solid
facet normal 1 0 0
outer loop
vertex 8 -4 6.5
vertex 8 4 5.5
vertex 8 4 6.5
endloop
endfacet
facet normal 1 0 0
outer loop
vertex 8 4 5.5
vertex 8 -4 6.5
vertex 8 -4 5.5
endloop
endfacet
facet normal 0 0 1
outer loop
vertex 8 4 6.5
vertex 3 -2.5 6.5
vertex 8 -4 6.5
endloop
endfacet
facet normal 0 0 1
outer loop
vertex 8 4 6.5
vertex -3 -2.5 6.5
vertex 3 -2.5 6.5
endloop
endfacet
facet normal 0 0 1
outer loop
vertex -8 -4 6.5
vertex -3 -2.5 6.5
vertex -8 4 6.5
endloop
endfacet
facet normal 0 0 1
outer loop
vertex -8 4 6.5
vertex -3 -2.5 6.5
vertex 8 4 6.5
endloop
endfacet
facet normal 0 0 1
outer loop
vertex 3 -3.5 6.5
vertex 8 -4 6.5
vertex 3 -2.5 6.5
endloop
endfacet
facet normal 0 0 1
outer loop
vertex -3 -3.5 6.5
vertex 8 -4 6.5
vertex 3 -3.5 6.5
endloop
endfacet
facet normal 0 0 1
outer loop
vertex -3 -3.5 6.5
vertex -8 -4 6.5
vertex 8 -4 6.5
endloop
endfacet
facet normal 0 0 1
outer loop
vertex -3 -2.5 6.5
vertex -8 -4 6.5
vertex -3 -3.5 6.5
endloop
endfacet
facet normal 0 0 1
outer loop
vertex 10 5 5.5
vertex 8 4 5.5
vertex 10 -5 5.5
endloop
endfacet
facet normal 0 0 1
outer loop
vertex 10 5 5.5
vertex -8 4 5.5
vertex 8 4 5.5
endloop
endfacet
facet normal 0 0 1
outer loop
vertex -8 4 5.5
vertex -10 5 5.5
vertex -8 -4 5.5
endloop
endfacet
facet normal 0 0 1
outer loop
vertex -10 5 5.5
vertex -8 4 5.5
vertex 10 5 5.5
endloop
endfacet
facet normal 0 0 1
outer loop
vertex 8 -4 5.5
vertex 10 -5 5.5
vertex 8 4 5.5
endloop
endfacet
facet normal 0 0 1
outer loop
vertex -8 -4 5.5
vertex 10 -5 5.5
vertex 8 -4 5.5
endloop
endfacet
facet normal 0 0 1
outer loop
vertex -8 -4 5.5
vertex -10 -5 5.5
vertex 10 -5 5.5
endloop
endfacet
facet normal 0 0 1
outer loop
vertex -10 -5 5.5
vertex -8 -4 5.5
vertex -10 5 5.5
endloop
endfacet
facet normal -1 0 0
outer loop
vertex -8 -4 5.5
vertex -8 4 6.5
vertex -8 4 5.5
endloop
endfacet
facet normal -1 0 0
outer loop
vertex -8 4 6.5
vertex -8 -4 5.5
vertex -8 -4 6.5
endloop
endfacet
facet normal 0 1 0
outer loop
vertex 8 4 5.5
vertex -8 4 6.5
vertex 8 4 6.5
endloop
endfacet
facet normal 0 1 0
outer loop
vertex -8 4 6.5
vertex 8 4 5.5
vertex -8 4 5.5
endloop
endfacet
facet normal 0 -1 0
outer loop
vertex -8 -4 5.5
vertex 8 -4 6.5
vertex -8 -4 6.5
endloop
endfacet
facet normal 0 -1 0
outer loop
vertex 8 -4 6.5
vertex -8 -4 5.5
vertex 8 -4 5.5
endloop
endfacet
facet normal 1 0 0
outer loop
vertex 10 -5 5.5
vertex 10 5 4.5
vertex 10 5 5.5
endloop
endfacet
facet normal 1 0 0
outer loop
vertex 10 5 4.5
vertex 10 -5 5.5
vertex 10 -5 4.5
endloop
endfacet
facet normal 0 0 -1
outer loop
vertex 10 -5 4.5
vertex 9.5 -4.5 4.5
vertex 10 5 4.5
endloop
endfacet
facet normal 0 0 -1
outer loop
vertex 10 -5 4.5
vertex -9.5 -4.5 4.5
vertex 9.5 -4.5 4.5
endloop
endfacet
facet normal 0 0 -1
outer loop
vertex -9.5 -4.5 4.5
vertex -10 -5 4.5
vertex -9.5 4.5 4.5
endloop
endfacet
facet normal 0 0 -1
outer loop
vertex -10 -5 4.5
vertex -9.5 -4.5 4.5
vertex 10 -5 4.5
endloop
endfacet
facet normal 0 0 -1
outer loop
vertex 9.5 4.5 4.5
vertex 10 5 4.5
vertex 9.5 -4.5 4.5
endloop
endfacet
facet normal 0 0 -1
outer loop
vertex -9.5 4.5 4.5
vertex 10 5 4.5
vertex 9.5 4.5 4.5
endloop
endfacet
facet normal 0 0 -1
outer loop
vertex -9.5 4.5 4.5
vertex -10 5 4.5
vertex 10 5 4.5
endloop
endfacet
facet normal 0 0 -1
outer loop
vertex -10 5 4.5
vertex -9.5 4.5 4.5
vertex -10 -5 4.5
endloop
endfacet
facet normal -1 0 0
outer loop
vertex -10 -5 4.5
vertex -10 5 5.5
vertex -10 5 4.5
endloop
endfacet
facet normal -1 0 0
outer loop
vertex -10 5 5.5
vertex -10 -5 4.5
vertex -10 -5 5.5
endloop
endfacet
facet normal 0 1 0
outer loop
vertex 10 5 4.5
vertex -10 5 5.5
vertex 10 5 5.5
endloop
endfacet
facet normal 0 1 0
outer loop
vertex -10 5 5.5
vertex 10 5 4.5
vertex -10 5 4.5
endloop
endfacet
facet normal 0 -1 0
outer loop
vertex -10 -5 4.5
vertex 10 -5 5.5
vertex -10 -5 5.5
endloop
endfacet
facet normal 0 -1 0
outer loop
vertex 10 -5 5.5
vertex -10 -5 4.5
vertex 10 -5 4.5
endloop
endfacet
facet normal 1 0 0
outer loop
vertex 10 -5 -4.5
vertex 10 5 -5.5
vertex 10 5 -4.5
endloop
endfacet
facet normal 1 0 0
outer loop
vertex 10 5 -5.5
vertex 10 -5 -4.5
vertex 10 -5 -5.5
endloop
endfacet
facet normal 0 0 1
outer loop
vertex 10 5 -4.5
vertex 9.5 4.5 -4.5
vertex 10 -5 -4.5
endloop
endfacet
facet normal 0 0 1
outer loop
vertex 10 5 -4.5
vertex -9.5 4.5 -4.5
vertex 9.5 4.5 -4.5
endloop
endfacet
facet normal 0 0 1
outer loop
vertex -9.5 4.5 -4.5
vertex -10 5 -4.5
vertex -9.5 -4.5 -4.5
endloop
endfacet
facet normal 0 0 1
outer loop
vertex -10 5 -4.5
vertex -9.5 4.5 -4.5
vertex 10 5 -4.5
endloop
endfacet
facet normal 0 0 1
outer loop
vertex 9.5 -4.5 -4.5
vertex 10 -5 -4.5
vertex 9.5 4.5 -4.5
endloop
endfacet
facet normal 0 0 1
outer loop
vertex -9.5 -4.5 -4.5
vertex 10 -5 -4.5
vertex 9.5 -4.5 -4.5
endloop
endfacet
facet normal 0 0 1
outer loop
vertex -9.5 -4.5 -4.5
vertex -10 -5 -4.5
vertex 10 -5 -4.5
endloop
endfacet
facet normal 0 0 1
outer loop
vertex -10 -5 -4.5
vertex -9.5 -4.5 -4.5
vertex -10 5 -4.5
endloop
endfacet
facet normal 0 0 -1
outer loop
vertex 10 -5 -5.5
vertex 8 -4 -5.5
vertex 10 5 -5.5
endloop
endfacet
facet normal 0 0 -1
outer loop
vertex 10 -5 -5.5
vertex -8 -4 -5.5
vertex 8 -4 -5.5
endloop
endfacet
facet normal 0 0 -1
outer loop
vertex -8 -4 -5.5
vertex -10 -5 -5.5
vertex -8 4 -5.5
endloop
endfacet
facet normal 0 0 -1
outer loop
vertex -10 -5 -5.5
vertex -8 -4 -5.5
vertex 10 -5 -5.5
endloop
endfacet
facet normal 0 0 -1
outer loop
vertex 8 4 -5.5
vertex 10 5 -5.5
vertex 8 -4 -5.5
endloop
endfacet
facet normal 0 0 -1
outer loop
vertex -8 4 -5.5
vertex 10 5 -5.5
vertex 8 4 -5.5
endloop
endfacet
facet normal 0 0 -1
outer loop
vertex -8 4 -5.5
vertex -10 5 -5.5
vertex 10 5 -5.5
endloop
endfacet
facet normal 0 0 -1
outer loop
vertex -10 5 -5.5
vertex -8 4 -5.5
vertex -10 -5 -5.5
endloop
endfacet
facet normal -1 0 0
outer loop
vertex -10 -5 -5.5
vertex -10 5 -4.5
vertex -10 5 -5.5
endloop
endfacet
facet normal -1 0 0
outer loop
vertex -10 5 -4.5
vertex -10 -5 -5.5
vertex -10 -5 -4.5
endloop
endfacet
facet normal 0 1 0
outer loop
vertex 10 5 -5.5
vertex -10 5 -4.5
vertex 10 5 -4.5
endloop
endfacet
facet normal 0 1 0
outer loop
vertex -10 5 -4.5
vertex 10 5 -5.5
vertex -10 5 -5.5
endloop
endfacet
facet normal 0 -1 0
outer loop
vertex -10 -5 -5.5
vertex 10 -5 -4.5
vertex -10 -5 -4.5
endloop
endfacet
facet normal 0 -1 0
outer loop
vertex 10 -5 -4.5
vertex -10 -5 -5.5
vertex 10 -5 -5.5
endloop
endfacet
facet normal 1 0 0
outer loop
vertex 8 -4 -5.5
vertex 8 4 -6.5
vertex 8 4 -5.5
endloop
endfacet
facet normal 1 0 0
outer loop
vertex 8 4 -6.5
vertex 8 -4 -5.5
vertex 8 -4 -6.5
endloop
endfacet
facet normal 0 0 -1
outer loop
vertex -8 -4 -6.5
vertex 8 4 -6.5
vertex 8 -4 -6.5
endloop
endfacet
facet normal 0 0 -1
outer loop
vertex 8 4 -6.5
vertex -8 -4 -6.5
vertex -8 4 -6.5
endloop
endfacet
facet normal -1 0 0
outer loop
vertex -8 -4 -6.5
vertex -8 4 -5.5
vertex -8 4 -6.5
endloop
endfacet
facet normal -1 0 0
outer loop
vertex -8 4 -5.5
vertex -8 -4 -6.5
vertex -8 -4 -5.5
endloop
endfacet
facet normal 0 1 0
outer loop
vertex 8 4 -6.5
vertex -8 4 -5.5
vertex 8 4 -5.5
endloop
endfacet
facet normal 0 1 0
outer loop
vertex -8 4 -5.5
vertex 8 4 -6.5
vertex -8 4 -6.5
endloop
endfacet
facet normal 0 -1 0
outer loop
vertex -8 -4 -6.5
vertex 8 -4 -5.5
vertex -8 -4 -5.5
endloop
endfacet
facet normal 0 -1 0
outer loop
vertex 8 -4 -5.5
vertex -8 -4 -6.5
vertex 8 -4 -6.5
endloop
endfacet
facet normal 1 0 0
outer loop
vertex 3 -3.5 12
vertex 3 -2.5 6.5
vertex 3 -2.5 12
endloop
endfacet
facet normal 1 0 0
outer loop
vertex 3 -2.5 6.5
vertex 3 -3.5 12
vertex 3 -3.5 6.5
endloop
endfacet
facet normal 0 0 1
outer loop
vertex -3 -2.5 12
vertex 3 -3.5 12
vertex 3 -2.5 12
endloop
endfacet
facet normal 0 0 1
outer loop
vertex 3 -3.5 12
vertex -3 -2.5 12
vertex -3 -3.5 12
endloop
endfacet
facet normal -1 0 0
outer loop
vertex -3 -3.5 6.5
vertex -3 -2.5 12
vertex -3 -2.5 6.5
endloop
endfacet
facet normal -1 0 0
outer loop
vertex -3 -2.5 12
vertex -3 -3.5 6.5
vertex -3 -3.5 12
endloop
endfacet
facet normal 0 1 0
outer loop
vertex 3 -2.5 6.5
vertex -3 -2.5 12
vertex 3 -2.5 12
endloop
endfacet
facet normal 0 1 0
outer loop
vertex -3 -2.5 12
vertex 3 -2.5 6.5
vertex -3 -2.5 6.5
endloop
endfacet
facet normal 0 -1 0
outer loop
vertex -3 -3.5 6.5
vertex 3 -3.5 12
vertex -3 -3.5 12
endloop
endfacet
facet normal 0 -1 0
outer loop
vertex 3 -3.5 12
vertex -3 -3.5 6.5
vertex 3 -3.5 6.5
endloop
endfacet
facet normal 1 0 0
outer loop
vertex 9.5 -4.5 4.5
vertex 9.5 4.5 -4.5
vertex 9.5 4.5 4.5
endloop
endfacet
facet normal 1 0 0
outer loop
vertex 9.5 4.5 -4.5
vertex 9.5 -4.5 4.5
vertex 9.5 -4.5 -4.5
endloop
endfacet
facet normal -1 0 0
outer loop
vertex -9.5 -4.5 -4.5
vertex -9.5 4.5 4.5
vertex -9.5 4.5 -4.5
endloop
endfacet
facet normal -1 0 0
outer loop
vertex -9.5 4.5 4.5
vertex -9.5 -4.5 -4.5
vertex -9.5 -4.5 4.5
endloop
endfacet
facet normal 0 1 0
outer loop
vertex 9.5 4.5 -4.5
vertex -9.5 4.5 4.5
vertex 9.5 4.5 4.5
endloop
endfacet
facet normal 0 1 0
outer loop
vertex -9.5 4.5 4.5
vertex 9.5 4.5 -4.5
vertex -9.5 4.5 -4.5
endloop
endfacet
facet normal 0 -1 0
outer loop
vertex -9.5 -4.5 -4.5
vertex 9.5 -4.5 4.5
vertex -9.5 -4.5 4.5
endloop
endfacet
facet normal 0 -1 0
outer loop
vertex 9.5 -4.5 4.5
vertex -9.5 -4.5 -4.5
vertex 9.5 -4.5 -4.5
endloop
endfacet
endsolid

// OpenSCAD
w = 20;
h = 10;
d = 10;

translate([0, 0, h/2+1]) cube(size=[w*.8, d*.8, 1], center=true);
translate([0, 0, h/2]) cube(size=[w, d, 1], center=true);
translate([0, 0, -h/2]) cube(size=[w, d, 1], center=true);
translate([0, 0, -h/2-1]) cube(size=[w*.8, d*.8, 1], center=true);

translate([0, -3, h/2+4]) cube(size=[6, 1, 6], center=true);

color([240/255, 240/255, 240/255, 0.5]) cube(size=[w-1, d-1, h -1], center=true);
